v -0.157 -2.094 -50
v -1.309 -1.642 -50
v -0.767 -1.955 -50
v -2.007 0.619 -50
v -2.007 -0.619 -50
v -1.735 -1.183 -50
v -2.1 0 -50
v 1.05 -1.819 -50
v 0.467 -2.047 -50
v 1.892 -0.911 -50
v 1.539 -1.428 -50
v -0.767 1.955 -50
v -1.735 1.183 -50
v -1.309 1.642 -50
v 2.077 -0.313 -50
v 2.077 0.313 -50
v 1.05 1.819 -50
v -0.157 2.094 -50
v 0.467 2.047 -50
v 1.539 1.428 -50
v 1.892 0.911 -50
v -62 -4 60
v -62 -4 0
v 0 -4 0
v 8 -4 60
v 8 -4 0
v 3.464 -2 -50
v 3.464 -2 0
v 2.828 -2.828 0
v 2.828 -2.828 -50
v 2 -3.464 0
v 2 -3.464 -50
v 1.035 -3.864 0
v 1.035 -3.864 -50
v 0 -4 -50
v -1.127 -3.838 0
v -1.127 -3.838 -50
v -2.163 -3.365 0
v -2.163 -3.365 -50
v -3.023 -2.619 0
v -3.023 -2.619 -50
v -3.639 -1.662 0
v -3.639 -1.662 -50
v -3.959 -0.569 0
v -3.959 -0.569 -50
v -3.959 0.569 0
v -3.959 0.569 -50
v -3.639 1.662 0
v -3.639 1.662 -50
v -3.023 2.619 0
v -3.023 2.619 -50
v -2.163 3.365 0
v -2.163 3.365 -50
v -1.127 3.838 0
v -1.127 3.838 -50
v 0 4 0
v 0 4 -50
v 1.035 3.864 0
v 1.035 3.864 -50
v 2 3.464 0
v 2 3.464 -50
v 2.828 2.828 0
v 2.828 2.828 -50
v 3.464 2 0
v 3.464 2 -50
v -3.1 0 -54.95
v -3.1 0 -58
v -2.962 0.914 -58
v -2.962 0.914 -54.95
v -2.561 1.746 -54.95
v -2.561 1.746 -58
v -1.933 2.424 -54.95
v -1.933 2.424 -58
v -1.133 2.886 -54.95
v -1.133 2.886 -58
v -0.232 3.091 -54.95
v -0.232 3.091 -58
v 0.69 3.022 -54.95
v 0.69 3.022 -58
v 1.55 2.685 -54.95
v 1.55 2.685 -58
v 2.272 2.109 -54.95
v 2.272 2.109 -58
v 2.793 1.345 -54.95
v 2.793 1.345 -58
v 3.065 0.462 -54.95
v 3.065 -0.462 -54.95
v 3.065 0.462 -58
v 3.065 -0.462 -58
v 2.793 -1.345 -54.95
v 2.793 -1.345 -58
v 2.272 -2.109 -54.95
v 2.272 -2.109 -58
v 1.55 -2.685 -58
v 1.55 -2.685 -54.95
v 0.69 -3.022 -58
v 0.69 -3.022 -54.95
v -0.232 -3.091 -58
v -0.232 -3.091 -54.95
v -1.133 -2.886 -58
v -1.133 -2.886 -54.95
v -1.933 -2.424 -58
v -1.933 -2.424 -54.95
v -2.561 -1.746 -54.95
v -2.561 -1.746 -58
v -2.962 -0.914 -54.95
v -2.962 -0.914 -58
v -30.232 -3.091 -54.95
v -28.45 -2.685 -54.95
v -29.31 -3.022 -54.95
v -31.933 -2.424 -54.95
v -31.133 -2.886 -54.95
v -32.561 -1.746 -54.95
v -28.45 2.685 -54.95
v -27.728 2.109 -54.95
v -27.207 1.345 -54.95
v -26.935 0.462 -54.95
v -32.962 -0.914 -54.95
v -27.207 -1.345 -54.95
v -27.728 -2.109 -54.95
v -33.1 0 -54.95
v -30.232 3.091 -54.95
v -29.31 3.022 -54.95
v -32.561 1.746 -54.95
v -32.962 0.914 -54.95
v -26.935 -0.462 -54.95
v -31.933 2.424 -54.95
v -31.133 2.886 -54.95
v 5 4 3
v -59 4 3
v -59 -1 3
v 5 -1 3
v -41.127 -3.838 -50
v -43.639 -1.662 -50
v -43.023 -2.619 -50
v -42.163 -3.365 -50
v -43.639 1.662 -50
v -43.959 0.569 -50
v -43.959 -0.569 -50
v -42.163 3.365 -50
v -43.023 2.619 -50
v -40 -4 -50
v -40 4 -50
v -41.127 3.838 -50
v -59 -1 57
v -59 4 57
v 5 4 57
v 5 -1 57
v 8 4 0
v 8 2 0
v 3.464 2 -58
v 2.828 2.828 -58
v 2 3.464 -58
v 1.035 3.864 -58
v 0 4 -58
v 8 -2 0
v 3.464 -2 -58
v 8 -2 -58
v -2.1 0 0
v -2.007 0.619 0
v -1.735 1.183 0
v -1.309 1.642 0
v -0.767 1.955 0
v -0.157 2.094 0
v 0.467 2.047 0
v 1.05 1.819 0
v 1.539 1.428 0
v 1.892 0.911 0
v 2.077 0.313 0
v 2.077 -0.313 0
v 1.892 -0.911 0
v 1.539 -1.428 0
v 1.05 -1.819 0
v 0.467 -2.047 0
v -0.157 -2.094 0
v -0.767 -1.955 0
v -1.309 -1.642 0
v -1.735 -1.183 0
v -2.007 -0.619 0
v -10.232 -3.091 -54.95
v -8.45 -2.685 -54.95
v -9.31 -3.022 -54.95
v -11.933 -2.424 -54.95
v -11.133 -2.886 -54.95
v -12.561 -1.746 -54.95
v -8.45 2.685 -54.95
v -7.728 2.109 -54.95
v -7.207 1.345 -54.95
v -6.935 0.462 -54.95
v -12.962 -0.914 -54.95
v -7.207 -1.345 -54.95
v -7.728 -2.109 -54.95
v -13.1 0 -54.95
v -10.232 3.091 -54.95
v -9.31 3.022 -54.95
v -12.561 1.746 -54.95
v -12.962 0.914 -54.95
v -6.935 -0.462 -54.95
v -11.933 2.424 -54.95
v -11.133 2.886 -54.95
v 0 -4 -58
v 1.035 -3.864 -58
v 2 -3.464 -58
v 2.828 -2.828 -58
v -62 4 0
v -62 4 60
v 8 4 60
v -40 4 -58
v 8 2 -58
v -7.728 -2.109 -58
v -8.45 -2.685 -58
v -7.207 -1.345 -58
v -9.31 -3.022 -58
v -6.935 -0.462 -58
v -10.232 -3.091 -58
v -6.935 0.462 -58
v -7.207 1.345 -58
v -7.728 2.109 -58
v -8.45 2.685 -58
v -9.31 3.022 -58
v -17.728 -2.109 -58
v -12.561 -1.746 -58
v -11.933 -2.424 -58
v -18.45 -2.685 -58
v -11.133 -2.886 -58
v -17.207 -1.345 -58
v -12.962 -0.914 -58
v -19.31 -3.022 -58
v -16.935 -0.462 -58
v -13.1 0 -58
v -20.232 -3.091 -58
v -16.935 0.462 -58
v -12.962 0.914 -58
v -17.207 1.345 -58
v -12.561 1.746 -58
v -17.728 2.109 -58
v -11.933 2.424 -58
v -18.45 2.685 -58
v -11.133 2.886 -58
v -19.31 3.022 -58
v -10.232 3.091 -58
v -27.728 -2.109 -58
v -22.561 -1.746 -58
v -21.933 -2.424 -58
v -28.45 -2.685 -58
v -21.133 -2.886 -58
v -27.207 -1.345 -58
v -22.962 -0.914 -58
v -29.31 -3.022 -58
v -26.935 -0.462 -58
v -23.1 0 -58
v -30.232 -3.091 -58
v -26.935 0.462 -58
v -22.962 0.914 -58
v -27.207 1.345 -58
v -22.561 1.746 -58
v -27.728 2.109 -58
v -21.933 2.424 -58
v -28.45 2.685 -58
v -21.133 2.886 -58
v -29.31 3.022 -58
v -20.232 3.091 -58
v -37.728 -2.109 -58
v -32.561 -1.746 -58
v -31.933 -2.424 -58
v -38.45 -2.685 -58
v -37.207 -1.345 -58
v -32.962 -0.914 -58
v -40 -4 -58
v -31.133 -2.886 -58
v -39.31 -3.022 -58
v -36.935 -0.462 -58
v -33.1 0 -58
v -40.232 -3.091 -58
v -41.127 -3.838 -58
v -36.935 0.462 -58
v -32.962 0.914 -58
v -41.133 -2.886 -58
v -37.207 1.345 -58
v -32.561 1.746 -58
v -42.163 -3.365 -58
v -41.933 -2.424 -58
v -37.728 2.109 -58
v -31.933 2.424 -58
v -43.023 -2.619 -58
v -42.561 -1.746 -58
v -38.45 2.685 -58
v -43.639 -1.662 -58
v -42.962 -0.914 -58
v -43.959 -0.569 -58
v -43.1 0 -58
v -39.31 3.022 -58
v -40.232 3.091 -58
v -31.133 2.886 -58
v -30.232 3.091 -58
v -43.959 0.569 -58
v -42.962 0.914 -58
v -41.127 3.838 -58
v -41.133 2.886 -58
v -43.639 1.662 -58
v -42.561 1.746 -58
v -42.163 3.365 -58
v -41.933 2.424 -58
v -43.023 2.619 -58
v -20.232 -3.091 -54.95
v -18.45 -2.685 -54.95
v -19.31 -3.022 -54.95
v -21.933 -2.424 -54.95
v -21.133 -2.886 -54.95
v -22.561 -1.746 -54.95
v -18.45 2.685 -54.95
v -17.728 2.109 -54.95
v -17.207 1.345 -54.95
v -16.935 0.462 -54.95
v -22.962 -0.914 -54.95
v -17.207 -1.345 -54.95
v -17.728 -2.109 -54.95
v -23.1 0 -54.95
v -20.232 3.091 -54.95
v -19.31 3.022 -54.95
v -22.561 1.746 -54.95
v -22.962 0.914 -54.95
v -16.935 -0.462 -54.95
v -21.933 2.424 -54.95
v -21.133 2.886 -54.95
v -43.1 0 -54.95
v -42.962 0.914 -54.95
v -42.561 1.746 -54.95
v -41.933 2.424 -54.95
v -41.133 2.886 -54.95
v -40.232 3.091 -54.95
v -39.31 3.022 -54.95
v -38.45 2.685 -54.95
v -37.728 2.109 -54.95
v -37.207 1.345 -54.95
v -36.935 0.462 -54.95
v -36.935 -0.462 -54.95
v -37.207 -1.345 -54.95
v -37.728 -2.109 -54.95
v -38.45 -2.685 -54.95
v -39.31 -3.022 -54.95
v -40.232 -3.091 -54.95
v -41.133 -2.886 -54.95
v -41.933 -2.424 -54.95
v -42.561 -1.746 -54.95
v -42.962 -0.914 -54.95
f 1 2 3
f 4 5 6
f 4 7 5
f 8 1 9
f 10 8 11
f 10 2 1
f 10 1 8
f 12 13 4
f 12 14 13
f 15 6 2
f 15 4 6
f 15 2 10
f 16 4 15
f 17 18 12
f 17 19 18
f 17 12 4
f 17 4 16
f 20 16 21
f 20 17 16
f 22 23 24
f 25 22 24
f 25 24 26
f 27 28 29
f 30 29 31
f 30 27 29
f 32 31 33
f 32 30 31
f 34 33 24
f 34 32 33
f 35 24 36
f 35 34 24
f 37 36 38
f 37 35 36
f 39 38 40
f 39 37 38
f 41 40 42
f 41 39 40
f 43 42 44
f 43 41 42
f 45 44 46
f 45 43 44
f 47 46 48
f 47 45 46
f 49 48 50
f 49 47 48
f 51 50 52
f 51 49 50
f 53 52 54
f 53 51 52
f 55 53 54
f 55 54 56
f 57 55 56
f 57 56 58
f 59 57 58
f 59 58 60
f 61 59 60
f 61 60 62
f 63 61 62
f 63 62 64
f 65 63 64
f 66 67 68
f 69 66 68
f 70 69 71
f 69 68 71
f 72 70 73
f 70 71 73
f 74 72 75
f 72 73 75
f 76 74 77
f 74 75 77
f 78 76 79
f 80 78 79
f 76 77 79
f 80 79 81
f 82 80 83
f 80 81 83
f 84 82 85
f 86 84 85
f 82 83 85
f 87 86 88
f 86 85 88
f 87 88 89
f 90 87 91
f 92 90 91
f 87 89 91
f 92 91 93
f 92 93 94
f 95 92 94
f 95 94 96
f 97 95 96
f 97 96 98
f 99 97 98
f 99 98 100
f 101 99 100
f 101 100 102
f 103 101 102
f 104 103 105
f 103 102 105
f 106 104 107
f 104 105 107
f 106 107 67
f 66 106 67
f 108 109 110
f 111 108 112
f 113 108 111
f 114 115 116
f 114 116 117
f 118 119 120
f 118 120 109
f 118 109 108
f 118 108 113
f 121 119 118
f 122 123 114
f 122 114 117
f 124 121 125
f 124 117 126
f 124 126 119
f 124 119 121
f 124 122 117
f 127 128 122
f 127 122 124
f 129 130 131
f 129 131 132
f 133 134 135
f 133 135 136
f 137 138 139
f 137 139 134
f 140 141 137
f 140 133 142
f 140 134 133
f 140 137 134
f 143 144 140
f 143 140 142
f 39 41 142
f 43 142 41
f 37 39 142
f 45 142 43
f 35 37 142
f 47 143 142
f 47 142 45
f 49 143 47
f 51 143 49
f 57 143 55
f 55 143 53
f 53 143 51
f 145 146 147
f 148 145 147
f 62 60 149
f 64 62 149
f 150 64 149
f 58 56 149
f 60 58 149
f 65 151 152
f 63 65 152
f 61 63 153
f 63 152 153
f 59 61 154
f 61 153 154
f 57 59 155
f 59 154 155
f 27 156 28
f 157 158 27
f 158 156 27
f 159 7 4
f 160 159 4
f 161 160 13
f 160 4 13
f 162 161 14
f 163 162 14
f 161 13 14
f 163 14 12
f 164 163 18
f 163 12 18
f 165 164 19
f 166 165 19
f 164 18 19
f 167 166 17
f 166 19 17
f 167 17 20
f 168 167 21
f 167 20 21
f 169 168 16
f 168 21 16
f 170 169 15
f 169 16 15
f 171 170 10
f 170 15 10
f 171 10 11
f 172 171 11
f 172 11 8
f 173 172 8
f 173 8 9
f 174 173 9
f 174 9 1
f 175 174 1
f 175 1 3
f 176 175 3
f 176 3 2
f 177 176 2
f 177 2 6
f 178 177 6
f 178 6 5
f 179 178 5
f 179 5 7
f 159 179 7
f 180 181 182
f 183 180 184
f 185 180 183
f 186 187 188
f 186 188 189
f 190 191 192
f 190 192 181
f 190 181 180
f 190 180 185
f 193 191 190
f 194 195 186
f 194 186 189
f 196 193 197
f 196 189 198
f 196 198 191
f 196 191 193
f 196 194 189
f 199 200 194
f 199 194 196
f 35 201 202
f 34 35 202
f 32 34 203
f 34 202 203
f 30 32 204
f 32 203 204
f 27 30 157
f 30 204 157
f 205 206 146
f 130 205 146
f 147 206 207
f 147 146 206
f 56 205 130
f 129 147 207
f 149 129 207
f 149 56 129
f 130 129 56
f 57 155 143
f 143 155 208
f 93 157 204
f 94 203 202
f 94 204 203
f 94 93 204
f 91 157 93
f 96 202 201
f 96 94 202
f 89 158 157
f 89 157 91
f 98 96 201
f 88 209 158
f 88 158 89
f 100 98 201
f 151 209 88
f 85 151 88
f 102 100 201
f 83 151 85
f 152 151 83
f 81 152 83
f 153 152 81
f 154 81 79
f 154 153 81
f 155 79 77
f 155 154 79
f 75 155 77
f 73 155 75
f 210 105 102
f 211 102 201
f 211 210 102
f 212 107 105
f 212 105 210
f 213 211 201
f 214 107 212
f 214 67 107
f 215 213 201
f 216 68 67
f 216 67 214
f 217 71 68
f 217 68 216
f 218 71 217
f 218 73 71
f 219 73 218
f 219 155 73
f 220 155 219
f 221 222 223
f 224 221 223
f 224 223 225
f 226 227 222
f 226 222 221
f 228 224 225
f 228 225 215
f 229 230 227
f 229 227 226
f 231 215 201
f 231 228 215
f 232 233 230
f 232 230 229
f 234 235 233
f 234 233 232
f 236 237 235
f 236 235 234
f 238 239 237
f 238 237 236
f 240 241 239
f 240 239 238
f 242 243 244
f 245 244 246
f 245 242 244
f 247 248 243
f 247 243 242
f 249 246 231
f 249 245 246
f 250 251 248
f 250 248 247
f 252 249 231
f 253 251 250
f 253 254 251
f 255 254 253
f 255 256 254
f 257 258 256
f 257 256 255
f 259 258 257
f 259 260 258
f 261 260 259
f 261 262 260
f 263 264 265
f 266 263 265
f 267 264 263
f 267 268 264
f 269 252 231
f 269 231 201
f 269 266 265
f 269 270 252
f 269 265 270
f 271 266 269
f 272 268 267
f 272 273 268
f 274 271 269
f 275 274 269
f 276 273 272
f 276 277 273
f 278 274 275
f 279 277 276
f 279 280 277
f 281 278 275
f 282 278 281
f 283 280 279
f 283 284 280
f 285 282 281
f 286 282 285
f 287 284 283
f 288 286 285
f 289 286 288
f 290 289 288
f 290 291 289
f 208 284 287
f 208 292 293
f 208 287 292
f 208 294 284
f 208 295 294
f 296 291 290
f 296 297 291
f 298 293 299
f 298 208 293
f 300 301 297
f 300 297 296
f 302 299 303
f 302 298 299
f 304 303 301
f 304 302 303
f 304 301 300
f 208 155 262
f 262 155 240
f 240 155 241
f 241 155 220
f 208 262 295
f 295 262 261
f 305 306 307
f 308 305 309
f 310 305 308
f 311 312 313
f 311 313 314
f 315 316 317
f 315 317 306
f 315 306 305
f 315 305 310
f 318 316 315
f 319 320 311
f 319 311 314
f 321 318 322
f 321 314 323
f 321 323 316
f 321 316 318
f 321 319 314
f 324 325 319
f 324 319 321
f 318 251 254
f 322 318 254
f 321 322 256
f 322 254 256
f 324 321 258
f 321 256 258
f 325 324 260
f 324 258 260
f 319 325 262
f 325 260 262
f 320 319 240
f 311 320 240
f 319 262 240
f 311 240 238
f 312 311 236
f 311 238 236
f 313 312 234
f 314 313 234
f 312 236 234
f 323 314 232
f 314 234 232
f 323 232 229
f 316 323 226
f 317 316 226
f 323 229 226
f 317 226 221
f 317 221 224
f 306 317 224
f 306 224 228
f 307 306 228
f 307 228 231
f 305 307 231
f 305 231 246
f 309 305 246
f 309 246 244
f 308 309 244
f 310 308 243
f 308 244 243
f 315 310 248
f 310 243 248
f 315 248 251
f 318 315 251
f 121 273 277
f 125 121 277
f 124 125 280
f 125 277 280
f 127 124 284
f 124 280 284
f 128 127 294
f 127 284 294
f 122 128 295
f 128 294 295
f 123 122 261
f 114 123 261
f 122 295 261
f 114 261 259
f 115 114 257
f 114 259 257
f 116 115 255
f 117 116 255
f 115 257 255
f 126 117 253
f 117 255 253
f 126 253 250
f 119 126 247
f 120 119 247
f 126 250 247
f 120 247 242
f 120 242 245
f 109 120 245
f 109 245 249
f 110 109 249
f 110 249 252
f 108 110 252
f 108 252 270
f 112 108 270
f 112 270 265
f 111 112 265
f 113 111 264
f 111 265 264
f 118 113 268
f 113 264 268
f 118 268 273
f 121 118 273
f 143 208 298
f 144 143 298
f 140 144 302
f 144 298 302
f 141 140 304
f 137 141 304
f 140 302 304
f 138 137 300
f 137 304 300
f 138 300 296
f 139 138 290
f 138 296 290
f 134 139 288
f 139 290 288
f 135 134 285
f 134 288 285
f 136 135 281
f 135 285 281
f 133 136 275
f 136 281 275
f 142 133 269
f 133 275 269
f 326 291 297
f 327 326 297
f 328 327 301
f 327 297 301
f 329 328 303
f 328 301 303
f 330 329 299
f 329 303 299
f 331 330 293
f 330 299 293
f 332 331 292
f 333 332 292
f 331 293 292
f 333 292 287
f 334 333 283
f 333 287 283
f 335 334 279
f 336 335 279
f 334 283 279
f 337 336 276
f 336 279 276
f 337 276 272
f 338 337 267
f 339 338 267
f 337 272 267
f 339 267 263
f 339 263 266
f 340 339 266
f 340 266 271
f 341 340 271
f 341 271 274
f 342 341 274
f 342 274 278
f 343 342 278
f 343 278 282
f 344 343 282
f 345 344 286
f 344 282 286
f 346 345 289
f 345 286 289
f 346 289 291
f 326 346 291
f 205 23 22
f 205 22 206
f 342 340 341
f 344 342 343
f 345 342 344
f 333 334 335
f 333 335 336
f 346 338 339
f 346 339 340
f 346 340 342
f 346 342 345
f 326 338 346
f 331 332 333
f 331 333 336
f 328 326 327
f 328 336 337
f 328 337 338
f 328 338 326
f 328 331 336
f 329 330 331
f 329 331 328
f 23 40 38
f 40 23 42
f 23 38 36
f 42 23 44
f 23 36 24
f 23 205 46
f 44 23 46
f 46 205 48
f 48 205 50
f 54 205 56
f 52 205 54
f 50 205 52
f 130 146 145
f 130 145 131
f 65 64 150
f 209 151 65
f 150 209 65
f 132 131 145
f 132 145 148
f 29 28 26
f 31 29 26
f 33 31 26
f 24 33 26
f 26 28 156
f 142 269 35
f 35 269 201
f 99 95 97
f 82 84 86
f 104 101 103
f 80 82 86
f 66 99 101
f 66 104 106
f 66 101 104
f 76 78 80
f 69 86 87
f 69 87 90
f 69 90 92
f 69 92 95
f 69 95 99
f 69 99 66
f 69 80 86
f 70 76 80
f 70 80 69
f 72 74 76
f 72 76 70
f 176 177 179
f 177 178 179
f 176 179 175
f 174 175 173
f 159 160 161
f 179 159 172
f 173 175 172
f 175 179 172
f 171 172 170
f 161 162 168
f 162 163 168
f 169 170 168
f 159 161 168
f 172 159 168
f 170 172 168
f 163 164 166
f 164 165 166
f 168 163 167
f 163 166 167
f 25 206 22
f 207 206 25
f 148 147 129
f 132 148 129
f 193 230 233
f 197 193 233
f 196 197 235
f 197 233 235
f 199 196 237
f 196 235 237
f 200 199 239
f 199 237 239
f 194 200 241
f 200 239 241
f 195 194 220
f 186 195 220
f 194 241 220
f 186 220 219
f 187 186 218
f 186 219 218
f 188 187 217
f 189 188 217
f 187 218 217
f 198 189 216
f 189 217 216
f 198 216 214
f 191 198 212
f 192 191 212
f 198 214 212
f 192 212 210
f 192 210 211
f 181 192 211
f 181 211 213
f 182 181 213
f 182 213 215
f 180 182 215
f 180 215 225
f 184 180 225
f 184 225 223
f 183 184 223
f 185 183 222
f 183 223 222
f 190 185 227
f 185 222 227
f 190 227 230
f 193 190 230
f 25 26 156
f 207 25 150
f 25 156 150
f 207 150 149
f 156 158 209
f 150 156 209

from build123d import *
from build123d.topology import SkipClean

# Parameters (mm, degrees)
EXTRUDE_1_DEPTH      = 5
EXTRUDE_1_DEPTH_BACK = 50
SKETCH_2_R           = 2.1
CUT_EXTRUDE_1_DEPTH  = 56.722526863
SKETCH_13_R          = 8.470611641
CUT_EXTRUDE_6_DEPTH  = 5
EXTRUDE_START        = 8
EXTRUDE_4_DEPTH      = 8
SKETCH_18_R          = 3.1
CUT_EXTRUDE_7_DEPTH  = 3.05
EXTRUDE_5_DEPTH      = 8
SKETCH_21_W          = 70
SKETCH_21_H          = 8
EXTRUDE_6_DEPTH      = 60
SKETCH_22_W          = 64
SKETCH_22_H          = 54
CUT_EXTRUDE_8_DEPTH  = 5


with BuildPart() as part:
    # ｽｹｯﾁ1 → ﾎﾞｽ - 押し出し1 (new, two sides: drawn at the far end of the back side and taken through both)
    with BuildSketch(Plane.XY.offset(-EXTRUDE_1_DEPTH_BACK)):
        with BuildLine():
            Line((3.464101615, 2), (8, 2))
            Line((8, 2), (8, -2))
            Line((8, -2), (3.464101615, -2))
            ThreePointArc((3.464101615, -2), (-4, 0), (3.464101615, 2))
        make_face()
    extrude(amount=EXTRUDE_1_DEPTH + EXTRUDE_1_DEPTH_BACK)

    # ｽｹｯﾁ2 → ｶｯﾄ - 押し出し1 (cut, through all)
    with BuildSketch(Plane(origin=(0, 0, -50), x_dir=(-1, 0, 0), z_dir=(0, 0, -1))):
        Circle(SKETCH_2_R)
    extrude(amount=-CUT_EXTRUDE_1_DEPTH, mode=Mode.SUBTRACT)

    # ｽｹｯﾁ13 → ｶｯﾄ - 押し出し6 (cut)
    with BuildSketch(Plane.XY.offset(5)):
        Circle(SKETCH_13_R)
    extrude(amount=-CUT_EXTRUDE_6_DEPTH, mode=Mode.SUBTRACT)

    # ｽｹｯﾁ15 → ﾎﾞｽ - 押し出し4 (add)
    with SkipClean():  # the faces are left unmerged after this step: merging them gives an invalid solid
        with BuildSketch(Plane(origin=(0, 0, -50), x_dir=(-1, 0, 0), z_dir=(0, 0, -1)).offset(EXTRUDE_START)):
            with BuildLine():
                Line((40, -4), (0, -4))
                ThreePointArc((0, -4), (-4, 0), (0, 4))
                Line((0, 4), (40, 4))
                ThreePointArc((40, 4), (44, 0), (40, -4))
            make_face()
        extrude(amount=-EXTRUDE_4_DEPTH)

    # ｽｹｯﾁ18 → ｶｯﾄ - 押し出し7 (cut)
    with SkipClean():  # the faces are left unmerged after this step: merging them gives an invalid solid
        with BuildSketch(Plane(origin=(0, 0, -58), x_dir=(-1, 0, 0), z_dir=(0, 0, -1))):
            Circle(SKETCH_18_R)
            with Locations((40, 0)):
                Circle(SKETCH_18_R)
            with Locations((20, 0)):
                Circle(SKETCH_18_R)
            with Locations((10, 0)):
                Circle(SKETCH_18_R)
            with Locations((30, 0)):
                Circle(SKETCH_18_R)
        extrude(amount=-CUT_EXTRUDE_7_DEPTH, mode=Mode.SUBTRACT)

    # ｽｹｯﾁ20 → ﾎﾞｽ - 押し出し5 (add)
    with BuildSketch(Plane(origin=(0, 0, -50), x_dir=(-1, 0, 0), z_dir=(0, 0, -1)).offset(EXTRUDE_START)):
        with BuildLine():
            Line((-3.464101615, 2), (-8, 2))
            Line((-8, 2), (-8, -2))
            Line((-8, -2), (-3.464101615, -2))
            ThreePointArc((-3.464101615, -2), (-4, 0), (-3.464101615, 2))
        make_face()
    extrude(amount=-EXTRUDE_5_DEPTH)

    # ｽｹｯﾁ21 → ﾎﾞｽ - 押し出し6 (add)
    with BuildSketch(Plane.XY):
        with Locations((-27, 0)):
            Rectangle(SKETCH_21_W, SKETCH_21_H)
    extrude(amount=EXTRUDE_6_DEPTH)

    # ｽｹｯﾁ22 → ｶｯﾄ - 押し出し8 (cut)
    with BuildSketch(Plane(origin=(0, 4, 0), x_dir=(1, 0, 0), z_dir=(0, 1, 0))):
        with Locations((-27, -30)):
            Rectangle(SKETCH_22_W, SKETCH_22_H)
    extrude(amount=-CUT_EXTRUDE_8_DEPTH, mode=Mode.SUBTRACT)


solid = part.part
